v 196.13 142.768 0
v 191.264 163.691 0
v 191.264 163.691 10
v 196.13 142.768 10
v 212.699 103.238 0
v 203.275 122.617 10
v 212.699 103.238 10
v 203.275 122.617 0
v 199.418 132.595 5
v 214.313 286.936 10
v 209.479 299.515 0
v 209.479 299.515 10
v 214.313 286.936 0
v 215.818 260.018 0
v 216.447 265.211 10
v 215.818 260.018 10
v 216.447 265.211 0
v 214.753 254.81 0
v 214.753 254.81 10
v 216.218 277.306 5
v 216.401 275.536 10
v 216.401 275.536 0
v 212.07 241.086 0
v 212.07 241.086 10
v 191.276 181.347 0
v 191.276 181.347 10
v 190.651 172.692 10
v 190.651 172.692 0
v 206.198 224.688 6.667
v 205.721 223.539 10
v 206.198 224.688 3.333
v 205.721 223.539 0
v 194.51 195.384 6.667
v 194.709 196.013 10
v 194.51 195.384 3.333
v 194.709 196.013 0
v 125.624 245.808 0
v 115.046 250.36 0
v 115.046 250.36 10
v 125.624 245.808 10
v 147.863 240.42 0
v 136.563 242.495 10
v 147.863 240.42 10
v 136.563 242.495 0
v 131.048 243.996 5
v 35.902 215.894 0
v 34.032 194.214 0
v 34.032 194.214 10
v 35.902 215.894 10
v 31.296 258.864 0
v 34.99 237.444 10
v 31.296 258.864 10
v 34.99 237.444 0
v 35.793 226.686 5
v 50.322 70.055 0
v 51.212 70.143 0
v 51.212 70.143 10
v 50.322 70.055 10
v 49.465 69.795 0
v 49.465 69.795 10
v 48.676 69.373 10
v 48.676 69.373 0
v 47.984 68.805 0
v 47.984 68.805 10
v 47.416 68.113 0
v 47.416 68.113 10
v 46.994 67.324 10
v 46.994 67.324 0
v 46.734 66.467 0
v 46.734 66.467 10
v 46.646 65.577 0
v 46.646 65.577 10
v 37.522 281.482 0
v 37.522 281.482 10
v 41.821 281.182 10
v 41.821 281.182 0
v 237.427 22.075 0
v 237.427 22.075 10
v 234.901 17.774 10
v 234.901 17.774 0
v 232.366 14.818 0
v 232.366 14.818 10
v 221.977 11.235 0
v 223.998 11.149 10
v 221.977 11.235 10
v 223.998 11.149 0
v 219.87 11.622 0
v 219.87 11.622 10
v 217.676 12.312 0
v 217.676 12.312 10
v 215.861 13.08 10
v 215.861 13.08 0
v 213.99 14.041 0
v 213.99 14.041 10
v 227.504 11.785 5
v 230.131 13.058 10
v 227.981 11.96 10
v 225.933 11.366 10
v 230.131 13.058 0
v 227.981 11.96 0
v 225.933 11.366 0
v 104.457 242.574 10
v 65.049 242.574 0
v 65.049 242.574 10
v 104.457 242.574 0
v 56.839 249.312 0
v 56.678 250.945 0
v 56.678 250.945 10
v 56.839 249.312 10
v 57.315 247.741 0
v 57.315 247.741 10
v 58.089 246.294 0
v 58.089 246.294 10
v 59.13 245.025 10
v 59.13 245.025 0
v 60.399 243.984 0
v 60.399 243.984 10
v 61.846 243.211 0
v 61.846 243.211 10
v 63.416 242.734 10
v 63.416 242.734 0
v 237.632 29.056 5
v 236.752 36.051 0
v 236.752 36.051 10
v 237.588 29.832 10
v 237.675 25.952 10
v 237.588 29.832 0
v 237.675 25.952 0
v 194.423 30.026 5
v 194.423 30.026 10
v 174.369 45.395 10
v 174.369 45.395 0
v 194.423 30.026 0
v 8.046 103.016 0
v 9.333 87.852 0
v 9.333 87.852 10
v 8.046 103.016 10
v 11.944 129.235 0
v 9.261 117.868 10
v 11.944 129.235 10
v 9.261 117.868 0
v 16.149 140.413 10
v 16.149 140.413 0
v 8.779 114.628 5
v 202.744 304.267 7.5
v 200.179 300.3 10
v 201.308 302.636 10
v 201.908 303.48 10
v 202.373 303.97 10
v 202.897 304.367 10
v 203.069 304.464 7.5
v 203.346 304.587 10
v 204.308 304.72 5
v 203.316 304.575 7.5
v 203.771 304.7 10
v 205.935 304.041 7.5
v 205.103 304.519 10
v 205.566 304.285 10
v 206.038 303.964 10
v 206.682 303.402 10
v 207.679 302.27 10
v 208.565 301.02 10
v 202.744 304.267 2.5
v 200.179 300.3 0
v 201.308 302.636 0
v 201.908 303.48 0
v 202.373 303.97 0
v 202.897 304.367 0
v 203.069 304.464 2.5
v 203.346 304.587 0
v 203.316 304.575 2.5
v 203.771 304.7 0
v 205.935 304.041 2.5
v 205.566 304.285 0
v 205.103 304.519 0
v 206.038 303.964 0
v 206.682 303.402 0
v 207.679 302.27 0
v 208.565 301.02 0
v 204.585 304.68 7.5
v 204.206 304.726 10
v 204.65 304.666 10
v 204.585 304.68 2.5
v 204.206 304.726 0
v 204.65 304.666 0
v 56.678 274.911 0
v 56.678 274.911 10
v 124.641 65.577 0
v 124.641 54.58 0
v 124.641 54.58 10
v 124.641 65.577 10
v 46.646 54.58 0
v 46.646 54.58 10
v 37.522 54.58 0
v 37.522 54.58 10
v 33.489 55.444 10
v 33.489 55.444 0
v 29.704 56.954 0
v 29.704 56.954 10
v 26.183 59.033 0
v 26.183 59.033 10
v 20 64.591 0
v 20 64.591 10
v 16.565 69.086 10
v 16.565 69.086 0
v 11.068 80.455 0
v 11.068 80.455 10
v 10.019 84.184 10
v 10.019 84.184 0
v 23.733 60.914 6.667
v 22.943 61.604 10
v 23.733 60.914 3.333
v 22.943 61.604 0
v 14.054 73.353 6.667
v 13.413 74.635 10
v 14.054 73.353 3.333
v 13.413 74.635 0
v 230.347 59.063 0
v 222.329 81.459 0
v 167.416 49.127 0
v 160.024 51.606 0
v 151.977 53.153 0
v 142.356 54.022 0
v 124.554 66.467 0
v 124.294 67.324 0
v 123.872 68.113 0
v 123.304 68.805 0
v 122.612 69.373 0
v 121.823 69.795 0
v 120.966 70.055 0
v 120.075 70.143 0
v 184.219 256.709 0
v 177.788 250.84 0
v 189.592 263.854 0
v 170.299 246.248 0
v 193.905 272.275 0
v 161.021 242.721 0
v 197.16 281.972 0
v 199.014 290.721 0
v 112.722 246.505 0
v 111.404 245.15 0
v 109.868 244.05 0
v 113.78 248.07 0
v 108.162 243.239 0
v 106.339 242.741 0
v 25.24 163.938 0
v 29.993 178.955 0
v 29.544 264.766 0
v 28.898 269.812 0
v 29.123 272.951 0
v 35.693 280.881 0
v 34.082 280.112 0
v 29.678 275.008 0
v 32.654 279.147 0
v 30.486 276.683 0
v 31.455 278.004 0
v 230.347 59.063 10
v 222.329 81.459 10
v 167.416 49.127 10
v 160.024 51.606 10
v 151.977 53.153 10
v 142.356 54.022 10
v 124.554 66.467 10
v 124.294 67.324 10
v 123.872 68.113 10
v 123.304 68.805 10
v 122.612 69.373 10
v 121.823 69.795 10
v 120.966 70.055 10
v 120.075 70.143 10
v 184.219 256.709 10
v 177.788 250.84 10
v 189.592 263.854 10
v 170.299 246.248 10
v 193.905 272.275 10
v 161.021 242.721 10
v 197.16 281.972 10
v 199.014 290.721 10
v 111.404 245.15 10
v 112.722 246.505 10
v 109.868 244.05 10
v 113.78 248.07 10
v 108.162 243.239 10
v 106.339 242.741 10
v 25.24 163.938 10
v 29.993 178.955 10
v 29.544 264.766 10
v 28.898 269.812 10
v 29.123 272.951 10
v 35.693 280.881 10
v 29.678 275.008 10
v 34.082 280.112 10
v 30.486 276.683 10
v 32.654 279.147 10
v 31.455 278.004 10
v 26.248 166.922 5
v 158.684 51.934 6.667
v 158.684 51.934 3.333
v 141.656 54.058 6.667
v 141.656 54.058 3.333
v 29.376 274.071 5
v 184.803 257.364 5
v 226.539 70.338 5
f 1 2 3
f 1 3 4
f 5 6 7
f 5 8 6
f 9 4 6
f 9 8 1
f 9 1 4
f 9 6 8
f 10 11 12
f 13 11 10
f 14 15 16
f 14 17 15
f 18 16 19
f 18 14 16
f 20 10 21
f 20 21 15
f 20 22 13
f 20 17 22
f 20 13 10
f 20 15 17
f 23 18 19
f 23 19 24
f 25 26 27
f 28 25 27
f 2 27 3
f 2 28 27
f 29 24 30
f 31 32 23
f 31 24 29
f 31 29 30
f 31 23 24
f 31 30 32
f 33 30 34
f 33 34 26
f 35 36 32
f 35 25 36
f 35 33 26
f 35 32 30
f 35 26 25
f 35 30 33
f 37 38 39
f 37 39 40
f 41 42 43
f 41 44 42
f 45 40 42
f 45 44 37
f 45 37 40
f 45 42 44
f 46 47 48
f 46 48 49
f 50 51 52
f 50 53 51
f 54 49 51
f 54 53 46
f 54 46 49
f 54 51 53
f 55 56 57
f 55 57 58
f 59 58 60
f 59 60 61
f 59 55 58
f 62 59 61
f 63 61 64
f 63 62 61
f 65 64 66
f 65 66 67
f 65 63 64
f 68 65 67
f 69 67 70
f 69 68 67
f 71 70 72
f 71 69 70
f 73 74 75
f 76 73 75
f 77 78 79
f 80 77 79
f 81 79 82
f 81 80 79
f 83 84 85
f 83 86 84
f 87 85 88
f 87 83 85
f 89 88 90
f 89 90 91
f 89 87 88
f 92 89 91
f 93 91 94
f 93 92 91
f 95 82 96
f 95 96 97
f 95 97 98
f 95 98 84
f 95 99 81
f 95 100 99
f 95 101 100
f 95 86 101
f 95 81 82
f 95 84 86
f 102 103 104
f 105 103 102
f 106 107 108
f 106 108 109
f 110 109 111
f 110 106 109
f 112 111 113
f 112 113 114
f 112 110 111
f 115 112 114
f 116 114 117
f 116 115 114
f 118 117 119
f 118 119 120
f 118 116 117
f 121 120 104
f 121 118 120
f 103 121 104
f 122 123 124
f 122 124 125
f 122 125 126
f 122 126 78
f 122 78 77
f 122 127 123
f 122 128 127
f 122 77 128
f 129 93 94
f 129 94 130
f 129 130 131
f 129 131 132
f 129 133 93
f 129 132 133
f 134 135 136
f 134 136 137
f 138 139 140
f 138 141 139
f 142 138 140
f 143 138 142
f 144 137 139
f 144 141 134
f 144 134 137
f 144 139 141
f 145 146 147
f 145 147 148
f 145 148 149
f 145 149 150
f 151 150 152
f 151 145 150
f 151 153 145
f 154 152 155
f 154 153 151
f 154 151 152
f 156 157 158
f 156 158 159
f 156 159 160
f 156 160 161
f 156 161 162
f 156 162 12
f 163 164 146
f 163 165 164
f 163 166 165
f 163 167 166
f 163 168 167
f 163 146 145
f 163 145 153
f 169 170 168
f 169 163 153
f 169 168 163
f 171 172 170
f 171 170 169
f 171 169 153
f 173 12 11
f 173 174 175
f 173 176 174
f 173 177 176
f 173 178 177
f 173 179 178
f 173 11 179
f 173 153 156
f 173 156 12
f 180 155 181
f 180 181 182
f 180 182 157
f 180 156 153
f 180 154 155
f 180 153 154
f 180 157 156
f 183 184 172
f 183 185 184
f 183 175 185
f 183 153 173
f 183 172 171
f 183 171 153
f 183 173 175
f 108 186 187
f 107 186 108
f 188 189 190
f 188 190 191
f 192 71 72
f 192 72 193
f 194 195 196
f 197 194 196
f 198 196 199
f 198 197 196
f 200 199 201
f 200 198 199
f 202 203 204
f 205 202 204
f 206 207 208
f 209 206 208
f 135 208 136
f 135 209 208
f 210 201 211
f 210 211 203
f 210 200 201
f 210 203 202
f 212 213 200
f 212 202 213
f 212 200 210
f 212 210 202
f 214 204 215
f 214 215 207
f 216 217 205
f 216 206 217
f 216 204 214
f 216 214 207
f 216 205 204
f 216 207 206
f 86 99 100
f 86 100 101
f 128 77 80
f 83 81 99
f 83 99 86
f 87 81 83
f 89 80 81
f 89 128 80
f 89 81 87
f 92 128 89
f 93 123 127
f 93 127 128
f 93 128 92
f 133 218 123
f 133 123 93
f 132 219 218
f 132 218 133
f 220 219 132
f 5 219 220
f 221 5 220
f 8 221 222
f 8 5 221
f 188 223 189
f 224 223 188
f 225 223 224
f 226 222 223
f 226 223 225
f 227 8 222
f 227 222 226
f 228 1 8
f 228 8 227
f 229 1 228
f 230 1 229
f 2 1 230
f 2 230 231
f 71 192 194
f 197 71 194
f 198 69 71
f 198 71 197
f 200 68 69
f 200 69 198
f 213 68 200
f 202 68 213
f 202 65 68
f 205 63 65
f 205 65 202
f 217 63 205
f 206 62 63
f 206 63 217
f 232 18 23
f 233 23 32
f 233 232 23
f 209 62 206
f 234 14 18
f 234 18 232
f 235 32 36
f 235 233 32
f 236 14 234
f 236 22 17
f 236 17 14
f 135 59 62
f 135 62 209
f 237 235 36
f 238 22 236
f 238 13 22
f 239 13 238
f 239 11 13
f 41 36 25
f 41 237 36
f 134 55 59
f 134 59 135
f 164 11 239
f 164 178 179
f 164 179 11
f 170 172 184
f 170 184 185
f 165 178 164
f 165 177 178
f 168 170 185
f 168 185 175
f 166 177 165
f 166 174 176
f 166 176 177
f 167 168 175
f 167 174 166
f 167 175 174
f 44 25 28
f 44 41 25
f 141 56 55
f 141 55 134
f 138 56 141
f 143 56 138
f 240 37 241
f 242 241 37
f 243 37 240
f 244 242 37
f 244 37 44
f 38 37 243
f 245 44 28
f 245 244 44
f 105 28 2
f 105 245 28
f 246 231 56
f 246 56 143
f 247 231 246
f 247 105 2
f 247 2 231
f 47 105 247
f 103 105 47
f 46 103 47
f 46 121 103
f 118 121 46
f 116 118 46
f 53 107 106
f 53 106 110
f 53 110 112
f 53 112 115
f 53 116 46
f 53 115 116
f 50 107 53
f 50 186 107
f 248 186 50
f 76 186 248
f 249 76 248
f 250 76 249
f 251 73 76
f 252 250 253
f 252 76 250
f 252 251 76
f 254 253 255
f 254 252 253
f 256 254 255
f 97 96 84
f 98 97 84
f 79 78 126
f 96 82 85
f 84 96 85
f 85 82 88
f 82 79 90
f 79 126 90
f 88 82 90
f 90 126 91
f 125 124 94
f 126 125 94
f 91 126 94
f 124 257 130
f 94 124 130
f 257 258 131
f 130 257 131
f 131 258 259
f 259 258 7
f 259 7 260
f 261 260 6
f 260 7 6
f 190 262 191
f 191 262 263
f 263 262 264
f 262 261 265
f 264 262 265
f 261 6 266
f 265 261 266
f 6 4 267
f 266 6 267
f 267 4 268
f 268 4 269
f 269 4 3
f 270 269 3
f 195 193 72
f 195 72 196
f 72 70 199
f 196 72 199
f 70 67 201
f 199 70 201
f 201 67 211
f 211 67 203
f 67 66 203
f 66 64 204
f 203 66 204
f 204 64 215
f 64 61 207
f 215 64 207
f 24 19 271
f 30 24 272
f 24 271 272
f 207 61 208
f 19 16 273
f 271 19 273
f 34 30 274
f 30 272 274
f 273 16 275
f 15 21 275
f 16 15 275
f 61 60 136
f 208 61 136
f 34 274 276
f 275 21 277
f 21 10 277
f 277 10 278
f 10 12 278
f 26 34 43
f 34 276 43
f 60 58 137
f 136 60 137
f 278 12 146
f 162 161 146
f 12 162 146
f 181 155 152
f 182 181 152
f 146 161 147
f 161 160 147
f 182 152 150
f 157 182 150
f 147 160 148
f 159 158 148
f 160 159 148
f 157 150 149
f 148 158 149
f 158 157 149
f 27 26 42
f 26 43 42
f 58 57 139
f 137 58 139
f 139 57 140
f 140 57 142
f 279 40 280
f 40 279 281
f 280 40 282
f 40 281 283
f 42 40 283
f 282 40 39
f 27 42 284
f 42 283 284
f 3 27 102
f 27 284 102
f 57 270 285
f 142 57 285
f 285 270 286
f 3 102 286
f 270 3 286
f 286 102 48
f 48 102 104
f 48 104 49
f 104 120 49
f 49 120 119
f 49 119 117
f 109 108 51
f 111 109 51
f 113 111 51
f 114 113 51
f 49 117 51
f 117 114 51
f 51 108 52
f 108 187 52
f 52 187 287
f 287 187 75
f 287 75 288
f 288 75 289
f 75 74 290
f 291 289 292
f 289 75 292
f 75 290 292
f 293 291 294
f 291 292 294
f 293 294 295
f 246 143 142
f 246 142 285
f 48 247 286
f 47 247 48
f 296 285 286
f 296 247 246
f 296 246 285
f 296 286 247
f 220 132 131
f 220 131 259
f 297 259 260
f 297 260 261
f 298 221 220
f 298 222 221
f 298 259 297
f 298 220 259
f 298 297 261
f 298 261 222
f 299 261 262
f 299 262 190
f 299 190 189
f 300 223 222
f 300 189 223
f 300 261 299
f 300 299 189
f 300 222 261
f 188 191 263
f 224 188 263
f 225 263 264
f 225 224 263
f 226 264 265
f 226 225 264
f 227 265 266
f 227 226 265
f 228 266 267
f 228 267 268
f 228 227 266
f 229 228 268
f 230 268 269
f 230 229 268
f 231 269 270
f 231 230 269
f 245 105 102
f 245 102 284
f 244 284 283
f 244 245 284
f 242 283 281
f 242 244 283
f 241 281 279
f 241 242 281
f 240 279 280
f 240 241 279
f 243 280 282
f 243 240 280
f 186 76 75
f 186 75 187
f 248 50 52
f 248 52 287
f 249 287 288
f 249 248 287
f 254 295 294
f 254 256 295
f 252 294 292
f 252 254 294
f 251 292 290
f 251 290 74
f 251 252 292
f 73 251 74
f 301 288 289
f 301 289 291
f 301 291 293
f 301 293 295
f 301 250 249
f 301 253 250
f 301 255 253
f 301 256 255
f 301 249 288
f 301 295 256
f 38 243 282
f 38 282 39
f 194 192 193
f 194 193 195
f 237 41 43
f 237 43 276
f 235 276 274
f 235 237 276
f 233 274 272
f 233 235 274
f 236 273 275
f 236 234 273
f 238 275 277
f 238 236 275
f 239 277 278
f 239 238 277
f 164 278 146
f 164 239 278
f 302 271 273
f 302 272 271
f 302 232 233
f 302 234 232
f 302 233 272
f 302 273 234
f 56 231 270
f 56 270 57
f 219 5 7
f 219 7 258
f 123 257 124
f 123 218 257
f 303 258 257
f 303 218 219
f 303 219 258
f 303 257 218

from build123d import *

# Parameters (mm, degrees)
BOSS_EXTRUDE1_DEPTH = 10


with BuildPart() as part:
    # Sketch2 → Boss-Extrude1 (new body)
    with BuildSketch(Plane.XY):
        with BuildLine():
            Line((124.641341211, 54.579558825), (124.641341211, 65.576654529))
            ThreePointArc((124.641341211, 65.576654529), (123.303990774, 68.805304092), (120.075341211, 70.142654529))
            Line((120.075341211, 70.142654529), (51.212390107, 70.142654529))
            ThreePointArc((51.212390107, 70.142654529), (47.983740544, 68.805304092), (46.646390107, 65.576654529))
            Line((46.646390107, 65.576654529), (46.646390107, 54.579558825))
            Line((46.646390107, 54.579558825), (37.522288645, 54.579558825))
            add(Edge.make_bspline(
                [(37.522288645, 54.579558825), (21.959514644, 56.51337661), (11.293168946, 73.672446471), (9.333160981, 87.851570435)],
                knots=[0, 0, 0, 0, 1, 1, 1, 1], degree=3))
            add(Edge.make_bspline(
                [(9.333160981, 87.851570435), (4.816885024, 115.123208654), (16.148817178, 140.412638245)],
                knots=[0, 0, 0, 1, 1, 1], degree=2))
            add(Edge.make_bspline(
                [(16.148817178, 140.412638245), (27.405872479, 166.530361958), (34.0318253, 194.214132047)],
                knots=[0, 0, 0, 1, 1, 1], degree=2))
            add(Edge.make_bspline(
                [(34.0318253, 194.214132047), (38.922769668, 226.832256951), (31.295716129, 258.863919402)],
                knots=[0, 0, 0, 1, 1, 1], degree=2))
            add(Edge.make_bspline(
                [(31.295716129, 258.863919402), (24.342240472, 277.969027169), (37.522288645, 281.482204385)],
                knots=[0, 0, 0, 1, 1, 1], degree=2))
            Line((37.522288645, 281.482204385), (41.820716746, 281.182482064))
            Line((41.820716746, 281.182482064), (56.678211753, 274.911461444))
            Line((56.678211753, 274.911461444), (56.678211753, 250.94461401))
            ThreePointArc((56.678211753, 250.94461401), (59.130020887, 245.025423145), (65.049211753, 242.57361401))
            Line((65.049211753, 242.57361401), (104.457119811, 242.57361401))
            ThreePointArc((104.457119811, 242.57361401), (109.86830274, 244.050097173), (113.779669547, 248.070310218))
            Line((113.779669547, 248.070310218), (115.046074428, 250.359514609))
            add(Edge.make_bspline(
                [(115.046074428, 250.359514609), (130.641476409, 242.603233813), (147.862901343, 240.41980261)],
                knots=[0, 0, 0, 1, 1, 1], degree=2))
            add(Edge.make_bspline(
                [(147.862901343, 240.41980261), (195.584291202, 244.368436644), (200.178603281, 300.299783152)],
                knots=[0, 0, 0, 1, 1, 1], degree=2))
            add(Edge.make_bspline(
                [(200.178603281, 300.299783152), (203.787730837, 309.531782357), (209.479274597, 299.515490412)],
                knots=[0, 0, 0, 1, 1, 1], degree=2))
            add(Edge.make_bspline(
                [(209.479274597, 299.515490412), (220.319872334, 277.449577488), (214.75338425, 254.809889378)],
                knots=[0, 0, 0, 1, 1, 1], degree=2))
            add(Edge.make_bspline(
                [(214.75338425, 254.809889378), (211.622795841, 223.210356753), (186.430957093, 197.647557224), (191.264009323, 163.691313614)],
                knots=[0, 0, 0, 0, 1, 1, 1, 1], degree=3))
            add(Edge.make_bspline(
                [(191.264009323, 163.691313614), (196.854658148, 131.726086499), (212.699126926, 103.238239648)],
                knots=[0, 0, 0, 1, 1, 1], degree=2))
            add(Edge.make_bspline(
                [(212.699126926, 103.238239648), (228.353478754, 71.031768285), (236.75185914, 36.050820835)],
                knots=[0, 0, 0, 1, 1, 1], degree=2))
            add(Edge.make_bspline(
                [(236.75185914, 36.050820835), (238.174984629, 29.048757065), (237.427230612, 22.075105786)],
                knots=[0, 0, 0, 1, 1, 1], degree=2))
            add(Edge.make_bspline(
                [(237.427230612, 22.075105786), (229.298254036, 5.512025134), (213.990313769, 14.041488397)],
                knots=[0, 0, 0, 1, 1, 1], degree=2))
            add(Edge.make_bspline(
                [(213.990313769, 14.041488397), (194.666199965, 30.334432476), (174.369459856, 45.394945883)],
                knots=[0, 0, 0, 1, 1, 1], degree=2))
            add(Edge.make_bspline(
                [(174.369459856, 45.394945883), (159.806078551, 55.078070021), (141.198769972, 53.922244486), (124.641341211, 54.579558825)],
                knots=[0, 0, 0, 0, 1, 1, 1, 1], degree=3))
        make_face()
    extrude(amount=BOSS_EXTRUDE1_DEPTH)


solid = part.part
